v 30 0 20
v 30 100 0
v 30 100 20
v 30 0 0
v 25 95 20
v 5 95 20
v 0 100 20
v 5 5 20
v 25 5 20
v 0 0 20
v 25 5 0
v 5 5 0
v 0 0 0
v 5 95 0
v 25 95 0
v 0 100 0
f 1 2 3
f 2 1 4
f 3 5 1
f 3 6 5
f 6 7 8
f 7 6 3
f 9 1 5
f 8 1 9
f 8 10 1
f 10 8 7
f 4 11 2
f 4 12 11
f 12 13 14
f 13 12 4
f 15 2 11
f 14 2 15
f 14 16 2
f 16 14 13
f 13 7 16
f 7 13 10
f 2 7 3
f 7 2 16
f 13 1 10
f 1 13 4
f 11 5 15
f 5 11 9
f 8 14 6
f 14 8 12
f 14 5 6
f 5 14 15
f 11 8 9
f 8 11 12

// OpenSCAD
module square_frame(groove_width, groove_length, groove_thickness, groove_height) {
    difference() {
        // Outer square
        cube([groove_width, groove_length, groove_height]);        
        // Inner square (cut out)
        translate([groove_thickness, groove_thickness, -1])  // Adjust for thickness
            cube([groove_width - 2 * groove_thickness, groove_length - 2 * groove_thickness, groove_height + 1]);
    }
}

// Example usage
square_frame(30, 100, 5, 20);  // Call the function with desired parameters
